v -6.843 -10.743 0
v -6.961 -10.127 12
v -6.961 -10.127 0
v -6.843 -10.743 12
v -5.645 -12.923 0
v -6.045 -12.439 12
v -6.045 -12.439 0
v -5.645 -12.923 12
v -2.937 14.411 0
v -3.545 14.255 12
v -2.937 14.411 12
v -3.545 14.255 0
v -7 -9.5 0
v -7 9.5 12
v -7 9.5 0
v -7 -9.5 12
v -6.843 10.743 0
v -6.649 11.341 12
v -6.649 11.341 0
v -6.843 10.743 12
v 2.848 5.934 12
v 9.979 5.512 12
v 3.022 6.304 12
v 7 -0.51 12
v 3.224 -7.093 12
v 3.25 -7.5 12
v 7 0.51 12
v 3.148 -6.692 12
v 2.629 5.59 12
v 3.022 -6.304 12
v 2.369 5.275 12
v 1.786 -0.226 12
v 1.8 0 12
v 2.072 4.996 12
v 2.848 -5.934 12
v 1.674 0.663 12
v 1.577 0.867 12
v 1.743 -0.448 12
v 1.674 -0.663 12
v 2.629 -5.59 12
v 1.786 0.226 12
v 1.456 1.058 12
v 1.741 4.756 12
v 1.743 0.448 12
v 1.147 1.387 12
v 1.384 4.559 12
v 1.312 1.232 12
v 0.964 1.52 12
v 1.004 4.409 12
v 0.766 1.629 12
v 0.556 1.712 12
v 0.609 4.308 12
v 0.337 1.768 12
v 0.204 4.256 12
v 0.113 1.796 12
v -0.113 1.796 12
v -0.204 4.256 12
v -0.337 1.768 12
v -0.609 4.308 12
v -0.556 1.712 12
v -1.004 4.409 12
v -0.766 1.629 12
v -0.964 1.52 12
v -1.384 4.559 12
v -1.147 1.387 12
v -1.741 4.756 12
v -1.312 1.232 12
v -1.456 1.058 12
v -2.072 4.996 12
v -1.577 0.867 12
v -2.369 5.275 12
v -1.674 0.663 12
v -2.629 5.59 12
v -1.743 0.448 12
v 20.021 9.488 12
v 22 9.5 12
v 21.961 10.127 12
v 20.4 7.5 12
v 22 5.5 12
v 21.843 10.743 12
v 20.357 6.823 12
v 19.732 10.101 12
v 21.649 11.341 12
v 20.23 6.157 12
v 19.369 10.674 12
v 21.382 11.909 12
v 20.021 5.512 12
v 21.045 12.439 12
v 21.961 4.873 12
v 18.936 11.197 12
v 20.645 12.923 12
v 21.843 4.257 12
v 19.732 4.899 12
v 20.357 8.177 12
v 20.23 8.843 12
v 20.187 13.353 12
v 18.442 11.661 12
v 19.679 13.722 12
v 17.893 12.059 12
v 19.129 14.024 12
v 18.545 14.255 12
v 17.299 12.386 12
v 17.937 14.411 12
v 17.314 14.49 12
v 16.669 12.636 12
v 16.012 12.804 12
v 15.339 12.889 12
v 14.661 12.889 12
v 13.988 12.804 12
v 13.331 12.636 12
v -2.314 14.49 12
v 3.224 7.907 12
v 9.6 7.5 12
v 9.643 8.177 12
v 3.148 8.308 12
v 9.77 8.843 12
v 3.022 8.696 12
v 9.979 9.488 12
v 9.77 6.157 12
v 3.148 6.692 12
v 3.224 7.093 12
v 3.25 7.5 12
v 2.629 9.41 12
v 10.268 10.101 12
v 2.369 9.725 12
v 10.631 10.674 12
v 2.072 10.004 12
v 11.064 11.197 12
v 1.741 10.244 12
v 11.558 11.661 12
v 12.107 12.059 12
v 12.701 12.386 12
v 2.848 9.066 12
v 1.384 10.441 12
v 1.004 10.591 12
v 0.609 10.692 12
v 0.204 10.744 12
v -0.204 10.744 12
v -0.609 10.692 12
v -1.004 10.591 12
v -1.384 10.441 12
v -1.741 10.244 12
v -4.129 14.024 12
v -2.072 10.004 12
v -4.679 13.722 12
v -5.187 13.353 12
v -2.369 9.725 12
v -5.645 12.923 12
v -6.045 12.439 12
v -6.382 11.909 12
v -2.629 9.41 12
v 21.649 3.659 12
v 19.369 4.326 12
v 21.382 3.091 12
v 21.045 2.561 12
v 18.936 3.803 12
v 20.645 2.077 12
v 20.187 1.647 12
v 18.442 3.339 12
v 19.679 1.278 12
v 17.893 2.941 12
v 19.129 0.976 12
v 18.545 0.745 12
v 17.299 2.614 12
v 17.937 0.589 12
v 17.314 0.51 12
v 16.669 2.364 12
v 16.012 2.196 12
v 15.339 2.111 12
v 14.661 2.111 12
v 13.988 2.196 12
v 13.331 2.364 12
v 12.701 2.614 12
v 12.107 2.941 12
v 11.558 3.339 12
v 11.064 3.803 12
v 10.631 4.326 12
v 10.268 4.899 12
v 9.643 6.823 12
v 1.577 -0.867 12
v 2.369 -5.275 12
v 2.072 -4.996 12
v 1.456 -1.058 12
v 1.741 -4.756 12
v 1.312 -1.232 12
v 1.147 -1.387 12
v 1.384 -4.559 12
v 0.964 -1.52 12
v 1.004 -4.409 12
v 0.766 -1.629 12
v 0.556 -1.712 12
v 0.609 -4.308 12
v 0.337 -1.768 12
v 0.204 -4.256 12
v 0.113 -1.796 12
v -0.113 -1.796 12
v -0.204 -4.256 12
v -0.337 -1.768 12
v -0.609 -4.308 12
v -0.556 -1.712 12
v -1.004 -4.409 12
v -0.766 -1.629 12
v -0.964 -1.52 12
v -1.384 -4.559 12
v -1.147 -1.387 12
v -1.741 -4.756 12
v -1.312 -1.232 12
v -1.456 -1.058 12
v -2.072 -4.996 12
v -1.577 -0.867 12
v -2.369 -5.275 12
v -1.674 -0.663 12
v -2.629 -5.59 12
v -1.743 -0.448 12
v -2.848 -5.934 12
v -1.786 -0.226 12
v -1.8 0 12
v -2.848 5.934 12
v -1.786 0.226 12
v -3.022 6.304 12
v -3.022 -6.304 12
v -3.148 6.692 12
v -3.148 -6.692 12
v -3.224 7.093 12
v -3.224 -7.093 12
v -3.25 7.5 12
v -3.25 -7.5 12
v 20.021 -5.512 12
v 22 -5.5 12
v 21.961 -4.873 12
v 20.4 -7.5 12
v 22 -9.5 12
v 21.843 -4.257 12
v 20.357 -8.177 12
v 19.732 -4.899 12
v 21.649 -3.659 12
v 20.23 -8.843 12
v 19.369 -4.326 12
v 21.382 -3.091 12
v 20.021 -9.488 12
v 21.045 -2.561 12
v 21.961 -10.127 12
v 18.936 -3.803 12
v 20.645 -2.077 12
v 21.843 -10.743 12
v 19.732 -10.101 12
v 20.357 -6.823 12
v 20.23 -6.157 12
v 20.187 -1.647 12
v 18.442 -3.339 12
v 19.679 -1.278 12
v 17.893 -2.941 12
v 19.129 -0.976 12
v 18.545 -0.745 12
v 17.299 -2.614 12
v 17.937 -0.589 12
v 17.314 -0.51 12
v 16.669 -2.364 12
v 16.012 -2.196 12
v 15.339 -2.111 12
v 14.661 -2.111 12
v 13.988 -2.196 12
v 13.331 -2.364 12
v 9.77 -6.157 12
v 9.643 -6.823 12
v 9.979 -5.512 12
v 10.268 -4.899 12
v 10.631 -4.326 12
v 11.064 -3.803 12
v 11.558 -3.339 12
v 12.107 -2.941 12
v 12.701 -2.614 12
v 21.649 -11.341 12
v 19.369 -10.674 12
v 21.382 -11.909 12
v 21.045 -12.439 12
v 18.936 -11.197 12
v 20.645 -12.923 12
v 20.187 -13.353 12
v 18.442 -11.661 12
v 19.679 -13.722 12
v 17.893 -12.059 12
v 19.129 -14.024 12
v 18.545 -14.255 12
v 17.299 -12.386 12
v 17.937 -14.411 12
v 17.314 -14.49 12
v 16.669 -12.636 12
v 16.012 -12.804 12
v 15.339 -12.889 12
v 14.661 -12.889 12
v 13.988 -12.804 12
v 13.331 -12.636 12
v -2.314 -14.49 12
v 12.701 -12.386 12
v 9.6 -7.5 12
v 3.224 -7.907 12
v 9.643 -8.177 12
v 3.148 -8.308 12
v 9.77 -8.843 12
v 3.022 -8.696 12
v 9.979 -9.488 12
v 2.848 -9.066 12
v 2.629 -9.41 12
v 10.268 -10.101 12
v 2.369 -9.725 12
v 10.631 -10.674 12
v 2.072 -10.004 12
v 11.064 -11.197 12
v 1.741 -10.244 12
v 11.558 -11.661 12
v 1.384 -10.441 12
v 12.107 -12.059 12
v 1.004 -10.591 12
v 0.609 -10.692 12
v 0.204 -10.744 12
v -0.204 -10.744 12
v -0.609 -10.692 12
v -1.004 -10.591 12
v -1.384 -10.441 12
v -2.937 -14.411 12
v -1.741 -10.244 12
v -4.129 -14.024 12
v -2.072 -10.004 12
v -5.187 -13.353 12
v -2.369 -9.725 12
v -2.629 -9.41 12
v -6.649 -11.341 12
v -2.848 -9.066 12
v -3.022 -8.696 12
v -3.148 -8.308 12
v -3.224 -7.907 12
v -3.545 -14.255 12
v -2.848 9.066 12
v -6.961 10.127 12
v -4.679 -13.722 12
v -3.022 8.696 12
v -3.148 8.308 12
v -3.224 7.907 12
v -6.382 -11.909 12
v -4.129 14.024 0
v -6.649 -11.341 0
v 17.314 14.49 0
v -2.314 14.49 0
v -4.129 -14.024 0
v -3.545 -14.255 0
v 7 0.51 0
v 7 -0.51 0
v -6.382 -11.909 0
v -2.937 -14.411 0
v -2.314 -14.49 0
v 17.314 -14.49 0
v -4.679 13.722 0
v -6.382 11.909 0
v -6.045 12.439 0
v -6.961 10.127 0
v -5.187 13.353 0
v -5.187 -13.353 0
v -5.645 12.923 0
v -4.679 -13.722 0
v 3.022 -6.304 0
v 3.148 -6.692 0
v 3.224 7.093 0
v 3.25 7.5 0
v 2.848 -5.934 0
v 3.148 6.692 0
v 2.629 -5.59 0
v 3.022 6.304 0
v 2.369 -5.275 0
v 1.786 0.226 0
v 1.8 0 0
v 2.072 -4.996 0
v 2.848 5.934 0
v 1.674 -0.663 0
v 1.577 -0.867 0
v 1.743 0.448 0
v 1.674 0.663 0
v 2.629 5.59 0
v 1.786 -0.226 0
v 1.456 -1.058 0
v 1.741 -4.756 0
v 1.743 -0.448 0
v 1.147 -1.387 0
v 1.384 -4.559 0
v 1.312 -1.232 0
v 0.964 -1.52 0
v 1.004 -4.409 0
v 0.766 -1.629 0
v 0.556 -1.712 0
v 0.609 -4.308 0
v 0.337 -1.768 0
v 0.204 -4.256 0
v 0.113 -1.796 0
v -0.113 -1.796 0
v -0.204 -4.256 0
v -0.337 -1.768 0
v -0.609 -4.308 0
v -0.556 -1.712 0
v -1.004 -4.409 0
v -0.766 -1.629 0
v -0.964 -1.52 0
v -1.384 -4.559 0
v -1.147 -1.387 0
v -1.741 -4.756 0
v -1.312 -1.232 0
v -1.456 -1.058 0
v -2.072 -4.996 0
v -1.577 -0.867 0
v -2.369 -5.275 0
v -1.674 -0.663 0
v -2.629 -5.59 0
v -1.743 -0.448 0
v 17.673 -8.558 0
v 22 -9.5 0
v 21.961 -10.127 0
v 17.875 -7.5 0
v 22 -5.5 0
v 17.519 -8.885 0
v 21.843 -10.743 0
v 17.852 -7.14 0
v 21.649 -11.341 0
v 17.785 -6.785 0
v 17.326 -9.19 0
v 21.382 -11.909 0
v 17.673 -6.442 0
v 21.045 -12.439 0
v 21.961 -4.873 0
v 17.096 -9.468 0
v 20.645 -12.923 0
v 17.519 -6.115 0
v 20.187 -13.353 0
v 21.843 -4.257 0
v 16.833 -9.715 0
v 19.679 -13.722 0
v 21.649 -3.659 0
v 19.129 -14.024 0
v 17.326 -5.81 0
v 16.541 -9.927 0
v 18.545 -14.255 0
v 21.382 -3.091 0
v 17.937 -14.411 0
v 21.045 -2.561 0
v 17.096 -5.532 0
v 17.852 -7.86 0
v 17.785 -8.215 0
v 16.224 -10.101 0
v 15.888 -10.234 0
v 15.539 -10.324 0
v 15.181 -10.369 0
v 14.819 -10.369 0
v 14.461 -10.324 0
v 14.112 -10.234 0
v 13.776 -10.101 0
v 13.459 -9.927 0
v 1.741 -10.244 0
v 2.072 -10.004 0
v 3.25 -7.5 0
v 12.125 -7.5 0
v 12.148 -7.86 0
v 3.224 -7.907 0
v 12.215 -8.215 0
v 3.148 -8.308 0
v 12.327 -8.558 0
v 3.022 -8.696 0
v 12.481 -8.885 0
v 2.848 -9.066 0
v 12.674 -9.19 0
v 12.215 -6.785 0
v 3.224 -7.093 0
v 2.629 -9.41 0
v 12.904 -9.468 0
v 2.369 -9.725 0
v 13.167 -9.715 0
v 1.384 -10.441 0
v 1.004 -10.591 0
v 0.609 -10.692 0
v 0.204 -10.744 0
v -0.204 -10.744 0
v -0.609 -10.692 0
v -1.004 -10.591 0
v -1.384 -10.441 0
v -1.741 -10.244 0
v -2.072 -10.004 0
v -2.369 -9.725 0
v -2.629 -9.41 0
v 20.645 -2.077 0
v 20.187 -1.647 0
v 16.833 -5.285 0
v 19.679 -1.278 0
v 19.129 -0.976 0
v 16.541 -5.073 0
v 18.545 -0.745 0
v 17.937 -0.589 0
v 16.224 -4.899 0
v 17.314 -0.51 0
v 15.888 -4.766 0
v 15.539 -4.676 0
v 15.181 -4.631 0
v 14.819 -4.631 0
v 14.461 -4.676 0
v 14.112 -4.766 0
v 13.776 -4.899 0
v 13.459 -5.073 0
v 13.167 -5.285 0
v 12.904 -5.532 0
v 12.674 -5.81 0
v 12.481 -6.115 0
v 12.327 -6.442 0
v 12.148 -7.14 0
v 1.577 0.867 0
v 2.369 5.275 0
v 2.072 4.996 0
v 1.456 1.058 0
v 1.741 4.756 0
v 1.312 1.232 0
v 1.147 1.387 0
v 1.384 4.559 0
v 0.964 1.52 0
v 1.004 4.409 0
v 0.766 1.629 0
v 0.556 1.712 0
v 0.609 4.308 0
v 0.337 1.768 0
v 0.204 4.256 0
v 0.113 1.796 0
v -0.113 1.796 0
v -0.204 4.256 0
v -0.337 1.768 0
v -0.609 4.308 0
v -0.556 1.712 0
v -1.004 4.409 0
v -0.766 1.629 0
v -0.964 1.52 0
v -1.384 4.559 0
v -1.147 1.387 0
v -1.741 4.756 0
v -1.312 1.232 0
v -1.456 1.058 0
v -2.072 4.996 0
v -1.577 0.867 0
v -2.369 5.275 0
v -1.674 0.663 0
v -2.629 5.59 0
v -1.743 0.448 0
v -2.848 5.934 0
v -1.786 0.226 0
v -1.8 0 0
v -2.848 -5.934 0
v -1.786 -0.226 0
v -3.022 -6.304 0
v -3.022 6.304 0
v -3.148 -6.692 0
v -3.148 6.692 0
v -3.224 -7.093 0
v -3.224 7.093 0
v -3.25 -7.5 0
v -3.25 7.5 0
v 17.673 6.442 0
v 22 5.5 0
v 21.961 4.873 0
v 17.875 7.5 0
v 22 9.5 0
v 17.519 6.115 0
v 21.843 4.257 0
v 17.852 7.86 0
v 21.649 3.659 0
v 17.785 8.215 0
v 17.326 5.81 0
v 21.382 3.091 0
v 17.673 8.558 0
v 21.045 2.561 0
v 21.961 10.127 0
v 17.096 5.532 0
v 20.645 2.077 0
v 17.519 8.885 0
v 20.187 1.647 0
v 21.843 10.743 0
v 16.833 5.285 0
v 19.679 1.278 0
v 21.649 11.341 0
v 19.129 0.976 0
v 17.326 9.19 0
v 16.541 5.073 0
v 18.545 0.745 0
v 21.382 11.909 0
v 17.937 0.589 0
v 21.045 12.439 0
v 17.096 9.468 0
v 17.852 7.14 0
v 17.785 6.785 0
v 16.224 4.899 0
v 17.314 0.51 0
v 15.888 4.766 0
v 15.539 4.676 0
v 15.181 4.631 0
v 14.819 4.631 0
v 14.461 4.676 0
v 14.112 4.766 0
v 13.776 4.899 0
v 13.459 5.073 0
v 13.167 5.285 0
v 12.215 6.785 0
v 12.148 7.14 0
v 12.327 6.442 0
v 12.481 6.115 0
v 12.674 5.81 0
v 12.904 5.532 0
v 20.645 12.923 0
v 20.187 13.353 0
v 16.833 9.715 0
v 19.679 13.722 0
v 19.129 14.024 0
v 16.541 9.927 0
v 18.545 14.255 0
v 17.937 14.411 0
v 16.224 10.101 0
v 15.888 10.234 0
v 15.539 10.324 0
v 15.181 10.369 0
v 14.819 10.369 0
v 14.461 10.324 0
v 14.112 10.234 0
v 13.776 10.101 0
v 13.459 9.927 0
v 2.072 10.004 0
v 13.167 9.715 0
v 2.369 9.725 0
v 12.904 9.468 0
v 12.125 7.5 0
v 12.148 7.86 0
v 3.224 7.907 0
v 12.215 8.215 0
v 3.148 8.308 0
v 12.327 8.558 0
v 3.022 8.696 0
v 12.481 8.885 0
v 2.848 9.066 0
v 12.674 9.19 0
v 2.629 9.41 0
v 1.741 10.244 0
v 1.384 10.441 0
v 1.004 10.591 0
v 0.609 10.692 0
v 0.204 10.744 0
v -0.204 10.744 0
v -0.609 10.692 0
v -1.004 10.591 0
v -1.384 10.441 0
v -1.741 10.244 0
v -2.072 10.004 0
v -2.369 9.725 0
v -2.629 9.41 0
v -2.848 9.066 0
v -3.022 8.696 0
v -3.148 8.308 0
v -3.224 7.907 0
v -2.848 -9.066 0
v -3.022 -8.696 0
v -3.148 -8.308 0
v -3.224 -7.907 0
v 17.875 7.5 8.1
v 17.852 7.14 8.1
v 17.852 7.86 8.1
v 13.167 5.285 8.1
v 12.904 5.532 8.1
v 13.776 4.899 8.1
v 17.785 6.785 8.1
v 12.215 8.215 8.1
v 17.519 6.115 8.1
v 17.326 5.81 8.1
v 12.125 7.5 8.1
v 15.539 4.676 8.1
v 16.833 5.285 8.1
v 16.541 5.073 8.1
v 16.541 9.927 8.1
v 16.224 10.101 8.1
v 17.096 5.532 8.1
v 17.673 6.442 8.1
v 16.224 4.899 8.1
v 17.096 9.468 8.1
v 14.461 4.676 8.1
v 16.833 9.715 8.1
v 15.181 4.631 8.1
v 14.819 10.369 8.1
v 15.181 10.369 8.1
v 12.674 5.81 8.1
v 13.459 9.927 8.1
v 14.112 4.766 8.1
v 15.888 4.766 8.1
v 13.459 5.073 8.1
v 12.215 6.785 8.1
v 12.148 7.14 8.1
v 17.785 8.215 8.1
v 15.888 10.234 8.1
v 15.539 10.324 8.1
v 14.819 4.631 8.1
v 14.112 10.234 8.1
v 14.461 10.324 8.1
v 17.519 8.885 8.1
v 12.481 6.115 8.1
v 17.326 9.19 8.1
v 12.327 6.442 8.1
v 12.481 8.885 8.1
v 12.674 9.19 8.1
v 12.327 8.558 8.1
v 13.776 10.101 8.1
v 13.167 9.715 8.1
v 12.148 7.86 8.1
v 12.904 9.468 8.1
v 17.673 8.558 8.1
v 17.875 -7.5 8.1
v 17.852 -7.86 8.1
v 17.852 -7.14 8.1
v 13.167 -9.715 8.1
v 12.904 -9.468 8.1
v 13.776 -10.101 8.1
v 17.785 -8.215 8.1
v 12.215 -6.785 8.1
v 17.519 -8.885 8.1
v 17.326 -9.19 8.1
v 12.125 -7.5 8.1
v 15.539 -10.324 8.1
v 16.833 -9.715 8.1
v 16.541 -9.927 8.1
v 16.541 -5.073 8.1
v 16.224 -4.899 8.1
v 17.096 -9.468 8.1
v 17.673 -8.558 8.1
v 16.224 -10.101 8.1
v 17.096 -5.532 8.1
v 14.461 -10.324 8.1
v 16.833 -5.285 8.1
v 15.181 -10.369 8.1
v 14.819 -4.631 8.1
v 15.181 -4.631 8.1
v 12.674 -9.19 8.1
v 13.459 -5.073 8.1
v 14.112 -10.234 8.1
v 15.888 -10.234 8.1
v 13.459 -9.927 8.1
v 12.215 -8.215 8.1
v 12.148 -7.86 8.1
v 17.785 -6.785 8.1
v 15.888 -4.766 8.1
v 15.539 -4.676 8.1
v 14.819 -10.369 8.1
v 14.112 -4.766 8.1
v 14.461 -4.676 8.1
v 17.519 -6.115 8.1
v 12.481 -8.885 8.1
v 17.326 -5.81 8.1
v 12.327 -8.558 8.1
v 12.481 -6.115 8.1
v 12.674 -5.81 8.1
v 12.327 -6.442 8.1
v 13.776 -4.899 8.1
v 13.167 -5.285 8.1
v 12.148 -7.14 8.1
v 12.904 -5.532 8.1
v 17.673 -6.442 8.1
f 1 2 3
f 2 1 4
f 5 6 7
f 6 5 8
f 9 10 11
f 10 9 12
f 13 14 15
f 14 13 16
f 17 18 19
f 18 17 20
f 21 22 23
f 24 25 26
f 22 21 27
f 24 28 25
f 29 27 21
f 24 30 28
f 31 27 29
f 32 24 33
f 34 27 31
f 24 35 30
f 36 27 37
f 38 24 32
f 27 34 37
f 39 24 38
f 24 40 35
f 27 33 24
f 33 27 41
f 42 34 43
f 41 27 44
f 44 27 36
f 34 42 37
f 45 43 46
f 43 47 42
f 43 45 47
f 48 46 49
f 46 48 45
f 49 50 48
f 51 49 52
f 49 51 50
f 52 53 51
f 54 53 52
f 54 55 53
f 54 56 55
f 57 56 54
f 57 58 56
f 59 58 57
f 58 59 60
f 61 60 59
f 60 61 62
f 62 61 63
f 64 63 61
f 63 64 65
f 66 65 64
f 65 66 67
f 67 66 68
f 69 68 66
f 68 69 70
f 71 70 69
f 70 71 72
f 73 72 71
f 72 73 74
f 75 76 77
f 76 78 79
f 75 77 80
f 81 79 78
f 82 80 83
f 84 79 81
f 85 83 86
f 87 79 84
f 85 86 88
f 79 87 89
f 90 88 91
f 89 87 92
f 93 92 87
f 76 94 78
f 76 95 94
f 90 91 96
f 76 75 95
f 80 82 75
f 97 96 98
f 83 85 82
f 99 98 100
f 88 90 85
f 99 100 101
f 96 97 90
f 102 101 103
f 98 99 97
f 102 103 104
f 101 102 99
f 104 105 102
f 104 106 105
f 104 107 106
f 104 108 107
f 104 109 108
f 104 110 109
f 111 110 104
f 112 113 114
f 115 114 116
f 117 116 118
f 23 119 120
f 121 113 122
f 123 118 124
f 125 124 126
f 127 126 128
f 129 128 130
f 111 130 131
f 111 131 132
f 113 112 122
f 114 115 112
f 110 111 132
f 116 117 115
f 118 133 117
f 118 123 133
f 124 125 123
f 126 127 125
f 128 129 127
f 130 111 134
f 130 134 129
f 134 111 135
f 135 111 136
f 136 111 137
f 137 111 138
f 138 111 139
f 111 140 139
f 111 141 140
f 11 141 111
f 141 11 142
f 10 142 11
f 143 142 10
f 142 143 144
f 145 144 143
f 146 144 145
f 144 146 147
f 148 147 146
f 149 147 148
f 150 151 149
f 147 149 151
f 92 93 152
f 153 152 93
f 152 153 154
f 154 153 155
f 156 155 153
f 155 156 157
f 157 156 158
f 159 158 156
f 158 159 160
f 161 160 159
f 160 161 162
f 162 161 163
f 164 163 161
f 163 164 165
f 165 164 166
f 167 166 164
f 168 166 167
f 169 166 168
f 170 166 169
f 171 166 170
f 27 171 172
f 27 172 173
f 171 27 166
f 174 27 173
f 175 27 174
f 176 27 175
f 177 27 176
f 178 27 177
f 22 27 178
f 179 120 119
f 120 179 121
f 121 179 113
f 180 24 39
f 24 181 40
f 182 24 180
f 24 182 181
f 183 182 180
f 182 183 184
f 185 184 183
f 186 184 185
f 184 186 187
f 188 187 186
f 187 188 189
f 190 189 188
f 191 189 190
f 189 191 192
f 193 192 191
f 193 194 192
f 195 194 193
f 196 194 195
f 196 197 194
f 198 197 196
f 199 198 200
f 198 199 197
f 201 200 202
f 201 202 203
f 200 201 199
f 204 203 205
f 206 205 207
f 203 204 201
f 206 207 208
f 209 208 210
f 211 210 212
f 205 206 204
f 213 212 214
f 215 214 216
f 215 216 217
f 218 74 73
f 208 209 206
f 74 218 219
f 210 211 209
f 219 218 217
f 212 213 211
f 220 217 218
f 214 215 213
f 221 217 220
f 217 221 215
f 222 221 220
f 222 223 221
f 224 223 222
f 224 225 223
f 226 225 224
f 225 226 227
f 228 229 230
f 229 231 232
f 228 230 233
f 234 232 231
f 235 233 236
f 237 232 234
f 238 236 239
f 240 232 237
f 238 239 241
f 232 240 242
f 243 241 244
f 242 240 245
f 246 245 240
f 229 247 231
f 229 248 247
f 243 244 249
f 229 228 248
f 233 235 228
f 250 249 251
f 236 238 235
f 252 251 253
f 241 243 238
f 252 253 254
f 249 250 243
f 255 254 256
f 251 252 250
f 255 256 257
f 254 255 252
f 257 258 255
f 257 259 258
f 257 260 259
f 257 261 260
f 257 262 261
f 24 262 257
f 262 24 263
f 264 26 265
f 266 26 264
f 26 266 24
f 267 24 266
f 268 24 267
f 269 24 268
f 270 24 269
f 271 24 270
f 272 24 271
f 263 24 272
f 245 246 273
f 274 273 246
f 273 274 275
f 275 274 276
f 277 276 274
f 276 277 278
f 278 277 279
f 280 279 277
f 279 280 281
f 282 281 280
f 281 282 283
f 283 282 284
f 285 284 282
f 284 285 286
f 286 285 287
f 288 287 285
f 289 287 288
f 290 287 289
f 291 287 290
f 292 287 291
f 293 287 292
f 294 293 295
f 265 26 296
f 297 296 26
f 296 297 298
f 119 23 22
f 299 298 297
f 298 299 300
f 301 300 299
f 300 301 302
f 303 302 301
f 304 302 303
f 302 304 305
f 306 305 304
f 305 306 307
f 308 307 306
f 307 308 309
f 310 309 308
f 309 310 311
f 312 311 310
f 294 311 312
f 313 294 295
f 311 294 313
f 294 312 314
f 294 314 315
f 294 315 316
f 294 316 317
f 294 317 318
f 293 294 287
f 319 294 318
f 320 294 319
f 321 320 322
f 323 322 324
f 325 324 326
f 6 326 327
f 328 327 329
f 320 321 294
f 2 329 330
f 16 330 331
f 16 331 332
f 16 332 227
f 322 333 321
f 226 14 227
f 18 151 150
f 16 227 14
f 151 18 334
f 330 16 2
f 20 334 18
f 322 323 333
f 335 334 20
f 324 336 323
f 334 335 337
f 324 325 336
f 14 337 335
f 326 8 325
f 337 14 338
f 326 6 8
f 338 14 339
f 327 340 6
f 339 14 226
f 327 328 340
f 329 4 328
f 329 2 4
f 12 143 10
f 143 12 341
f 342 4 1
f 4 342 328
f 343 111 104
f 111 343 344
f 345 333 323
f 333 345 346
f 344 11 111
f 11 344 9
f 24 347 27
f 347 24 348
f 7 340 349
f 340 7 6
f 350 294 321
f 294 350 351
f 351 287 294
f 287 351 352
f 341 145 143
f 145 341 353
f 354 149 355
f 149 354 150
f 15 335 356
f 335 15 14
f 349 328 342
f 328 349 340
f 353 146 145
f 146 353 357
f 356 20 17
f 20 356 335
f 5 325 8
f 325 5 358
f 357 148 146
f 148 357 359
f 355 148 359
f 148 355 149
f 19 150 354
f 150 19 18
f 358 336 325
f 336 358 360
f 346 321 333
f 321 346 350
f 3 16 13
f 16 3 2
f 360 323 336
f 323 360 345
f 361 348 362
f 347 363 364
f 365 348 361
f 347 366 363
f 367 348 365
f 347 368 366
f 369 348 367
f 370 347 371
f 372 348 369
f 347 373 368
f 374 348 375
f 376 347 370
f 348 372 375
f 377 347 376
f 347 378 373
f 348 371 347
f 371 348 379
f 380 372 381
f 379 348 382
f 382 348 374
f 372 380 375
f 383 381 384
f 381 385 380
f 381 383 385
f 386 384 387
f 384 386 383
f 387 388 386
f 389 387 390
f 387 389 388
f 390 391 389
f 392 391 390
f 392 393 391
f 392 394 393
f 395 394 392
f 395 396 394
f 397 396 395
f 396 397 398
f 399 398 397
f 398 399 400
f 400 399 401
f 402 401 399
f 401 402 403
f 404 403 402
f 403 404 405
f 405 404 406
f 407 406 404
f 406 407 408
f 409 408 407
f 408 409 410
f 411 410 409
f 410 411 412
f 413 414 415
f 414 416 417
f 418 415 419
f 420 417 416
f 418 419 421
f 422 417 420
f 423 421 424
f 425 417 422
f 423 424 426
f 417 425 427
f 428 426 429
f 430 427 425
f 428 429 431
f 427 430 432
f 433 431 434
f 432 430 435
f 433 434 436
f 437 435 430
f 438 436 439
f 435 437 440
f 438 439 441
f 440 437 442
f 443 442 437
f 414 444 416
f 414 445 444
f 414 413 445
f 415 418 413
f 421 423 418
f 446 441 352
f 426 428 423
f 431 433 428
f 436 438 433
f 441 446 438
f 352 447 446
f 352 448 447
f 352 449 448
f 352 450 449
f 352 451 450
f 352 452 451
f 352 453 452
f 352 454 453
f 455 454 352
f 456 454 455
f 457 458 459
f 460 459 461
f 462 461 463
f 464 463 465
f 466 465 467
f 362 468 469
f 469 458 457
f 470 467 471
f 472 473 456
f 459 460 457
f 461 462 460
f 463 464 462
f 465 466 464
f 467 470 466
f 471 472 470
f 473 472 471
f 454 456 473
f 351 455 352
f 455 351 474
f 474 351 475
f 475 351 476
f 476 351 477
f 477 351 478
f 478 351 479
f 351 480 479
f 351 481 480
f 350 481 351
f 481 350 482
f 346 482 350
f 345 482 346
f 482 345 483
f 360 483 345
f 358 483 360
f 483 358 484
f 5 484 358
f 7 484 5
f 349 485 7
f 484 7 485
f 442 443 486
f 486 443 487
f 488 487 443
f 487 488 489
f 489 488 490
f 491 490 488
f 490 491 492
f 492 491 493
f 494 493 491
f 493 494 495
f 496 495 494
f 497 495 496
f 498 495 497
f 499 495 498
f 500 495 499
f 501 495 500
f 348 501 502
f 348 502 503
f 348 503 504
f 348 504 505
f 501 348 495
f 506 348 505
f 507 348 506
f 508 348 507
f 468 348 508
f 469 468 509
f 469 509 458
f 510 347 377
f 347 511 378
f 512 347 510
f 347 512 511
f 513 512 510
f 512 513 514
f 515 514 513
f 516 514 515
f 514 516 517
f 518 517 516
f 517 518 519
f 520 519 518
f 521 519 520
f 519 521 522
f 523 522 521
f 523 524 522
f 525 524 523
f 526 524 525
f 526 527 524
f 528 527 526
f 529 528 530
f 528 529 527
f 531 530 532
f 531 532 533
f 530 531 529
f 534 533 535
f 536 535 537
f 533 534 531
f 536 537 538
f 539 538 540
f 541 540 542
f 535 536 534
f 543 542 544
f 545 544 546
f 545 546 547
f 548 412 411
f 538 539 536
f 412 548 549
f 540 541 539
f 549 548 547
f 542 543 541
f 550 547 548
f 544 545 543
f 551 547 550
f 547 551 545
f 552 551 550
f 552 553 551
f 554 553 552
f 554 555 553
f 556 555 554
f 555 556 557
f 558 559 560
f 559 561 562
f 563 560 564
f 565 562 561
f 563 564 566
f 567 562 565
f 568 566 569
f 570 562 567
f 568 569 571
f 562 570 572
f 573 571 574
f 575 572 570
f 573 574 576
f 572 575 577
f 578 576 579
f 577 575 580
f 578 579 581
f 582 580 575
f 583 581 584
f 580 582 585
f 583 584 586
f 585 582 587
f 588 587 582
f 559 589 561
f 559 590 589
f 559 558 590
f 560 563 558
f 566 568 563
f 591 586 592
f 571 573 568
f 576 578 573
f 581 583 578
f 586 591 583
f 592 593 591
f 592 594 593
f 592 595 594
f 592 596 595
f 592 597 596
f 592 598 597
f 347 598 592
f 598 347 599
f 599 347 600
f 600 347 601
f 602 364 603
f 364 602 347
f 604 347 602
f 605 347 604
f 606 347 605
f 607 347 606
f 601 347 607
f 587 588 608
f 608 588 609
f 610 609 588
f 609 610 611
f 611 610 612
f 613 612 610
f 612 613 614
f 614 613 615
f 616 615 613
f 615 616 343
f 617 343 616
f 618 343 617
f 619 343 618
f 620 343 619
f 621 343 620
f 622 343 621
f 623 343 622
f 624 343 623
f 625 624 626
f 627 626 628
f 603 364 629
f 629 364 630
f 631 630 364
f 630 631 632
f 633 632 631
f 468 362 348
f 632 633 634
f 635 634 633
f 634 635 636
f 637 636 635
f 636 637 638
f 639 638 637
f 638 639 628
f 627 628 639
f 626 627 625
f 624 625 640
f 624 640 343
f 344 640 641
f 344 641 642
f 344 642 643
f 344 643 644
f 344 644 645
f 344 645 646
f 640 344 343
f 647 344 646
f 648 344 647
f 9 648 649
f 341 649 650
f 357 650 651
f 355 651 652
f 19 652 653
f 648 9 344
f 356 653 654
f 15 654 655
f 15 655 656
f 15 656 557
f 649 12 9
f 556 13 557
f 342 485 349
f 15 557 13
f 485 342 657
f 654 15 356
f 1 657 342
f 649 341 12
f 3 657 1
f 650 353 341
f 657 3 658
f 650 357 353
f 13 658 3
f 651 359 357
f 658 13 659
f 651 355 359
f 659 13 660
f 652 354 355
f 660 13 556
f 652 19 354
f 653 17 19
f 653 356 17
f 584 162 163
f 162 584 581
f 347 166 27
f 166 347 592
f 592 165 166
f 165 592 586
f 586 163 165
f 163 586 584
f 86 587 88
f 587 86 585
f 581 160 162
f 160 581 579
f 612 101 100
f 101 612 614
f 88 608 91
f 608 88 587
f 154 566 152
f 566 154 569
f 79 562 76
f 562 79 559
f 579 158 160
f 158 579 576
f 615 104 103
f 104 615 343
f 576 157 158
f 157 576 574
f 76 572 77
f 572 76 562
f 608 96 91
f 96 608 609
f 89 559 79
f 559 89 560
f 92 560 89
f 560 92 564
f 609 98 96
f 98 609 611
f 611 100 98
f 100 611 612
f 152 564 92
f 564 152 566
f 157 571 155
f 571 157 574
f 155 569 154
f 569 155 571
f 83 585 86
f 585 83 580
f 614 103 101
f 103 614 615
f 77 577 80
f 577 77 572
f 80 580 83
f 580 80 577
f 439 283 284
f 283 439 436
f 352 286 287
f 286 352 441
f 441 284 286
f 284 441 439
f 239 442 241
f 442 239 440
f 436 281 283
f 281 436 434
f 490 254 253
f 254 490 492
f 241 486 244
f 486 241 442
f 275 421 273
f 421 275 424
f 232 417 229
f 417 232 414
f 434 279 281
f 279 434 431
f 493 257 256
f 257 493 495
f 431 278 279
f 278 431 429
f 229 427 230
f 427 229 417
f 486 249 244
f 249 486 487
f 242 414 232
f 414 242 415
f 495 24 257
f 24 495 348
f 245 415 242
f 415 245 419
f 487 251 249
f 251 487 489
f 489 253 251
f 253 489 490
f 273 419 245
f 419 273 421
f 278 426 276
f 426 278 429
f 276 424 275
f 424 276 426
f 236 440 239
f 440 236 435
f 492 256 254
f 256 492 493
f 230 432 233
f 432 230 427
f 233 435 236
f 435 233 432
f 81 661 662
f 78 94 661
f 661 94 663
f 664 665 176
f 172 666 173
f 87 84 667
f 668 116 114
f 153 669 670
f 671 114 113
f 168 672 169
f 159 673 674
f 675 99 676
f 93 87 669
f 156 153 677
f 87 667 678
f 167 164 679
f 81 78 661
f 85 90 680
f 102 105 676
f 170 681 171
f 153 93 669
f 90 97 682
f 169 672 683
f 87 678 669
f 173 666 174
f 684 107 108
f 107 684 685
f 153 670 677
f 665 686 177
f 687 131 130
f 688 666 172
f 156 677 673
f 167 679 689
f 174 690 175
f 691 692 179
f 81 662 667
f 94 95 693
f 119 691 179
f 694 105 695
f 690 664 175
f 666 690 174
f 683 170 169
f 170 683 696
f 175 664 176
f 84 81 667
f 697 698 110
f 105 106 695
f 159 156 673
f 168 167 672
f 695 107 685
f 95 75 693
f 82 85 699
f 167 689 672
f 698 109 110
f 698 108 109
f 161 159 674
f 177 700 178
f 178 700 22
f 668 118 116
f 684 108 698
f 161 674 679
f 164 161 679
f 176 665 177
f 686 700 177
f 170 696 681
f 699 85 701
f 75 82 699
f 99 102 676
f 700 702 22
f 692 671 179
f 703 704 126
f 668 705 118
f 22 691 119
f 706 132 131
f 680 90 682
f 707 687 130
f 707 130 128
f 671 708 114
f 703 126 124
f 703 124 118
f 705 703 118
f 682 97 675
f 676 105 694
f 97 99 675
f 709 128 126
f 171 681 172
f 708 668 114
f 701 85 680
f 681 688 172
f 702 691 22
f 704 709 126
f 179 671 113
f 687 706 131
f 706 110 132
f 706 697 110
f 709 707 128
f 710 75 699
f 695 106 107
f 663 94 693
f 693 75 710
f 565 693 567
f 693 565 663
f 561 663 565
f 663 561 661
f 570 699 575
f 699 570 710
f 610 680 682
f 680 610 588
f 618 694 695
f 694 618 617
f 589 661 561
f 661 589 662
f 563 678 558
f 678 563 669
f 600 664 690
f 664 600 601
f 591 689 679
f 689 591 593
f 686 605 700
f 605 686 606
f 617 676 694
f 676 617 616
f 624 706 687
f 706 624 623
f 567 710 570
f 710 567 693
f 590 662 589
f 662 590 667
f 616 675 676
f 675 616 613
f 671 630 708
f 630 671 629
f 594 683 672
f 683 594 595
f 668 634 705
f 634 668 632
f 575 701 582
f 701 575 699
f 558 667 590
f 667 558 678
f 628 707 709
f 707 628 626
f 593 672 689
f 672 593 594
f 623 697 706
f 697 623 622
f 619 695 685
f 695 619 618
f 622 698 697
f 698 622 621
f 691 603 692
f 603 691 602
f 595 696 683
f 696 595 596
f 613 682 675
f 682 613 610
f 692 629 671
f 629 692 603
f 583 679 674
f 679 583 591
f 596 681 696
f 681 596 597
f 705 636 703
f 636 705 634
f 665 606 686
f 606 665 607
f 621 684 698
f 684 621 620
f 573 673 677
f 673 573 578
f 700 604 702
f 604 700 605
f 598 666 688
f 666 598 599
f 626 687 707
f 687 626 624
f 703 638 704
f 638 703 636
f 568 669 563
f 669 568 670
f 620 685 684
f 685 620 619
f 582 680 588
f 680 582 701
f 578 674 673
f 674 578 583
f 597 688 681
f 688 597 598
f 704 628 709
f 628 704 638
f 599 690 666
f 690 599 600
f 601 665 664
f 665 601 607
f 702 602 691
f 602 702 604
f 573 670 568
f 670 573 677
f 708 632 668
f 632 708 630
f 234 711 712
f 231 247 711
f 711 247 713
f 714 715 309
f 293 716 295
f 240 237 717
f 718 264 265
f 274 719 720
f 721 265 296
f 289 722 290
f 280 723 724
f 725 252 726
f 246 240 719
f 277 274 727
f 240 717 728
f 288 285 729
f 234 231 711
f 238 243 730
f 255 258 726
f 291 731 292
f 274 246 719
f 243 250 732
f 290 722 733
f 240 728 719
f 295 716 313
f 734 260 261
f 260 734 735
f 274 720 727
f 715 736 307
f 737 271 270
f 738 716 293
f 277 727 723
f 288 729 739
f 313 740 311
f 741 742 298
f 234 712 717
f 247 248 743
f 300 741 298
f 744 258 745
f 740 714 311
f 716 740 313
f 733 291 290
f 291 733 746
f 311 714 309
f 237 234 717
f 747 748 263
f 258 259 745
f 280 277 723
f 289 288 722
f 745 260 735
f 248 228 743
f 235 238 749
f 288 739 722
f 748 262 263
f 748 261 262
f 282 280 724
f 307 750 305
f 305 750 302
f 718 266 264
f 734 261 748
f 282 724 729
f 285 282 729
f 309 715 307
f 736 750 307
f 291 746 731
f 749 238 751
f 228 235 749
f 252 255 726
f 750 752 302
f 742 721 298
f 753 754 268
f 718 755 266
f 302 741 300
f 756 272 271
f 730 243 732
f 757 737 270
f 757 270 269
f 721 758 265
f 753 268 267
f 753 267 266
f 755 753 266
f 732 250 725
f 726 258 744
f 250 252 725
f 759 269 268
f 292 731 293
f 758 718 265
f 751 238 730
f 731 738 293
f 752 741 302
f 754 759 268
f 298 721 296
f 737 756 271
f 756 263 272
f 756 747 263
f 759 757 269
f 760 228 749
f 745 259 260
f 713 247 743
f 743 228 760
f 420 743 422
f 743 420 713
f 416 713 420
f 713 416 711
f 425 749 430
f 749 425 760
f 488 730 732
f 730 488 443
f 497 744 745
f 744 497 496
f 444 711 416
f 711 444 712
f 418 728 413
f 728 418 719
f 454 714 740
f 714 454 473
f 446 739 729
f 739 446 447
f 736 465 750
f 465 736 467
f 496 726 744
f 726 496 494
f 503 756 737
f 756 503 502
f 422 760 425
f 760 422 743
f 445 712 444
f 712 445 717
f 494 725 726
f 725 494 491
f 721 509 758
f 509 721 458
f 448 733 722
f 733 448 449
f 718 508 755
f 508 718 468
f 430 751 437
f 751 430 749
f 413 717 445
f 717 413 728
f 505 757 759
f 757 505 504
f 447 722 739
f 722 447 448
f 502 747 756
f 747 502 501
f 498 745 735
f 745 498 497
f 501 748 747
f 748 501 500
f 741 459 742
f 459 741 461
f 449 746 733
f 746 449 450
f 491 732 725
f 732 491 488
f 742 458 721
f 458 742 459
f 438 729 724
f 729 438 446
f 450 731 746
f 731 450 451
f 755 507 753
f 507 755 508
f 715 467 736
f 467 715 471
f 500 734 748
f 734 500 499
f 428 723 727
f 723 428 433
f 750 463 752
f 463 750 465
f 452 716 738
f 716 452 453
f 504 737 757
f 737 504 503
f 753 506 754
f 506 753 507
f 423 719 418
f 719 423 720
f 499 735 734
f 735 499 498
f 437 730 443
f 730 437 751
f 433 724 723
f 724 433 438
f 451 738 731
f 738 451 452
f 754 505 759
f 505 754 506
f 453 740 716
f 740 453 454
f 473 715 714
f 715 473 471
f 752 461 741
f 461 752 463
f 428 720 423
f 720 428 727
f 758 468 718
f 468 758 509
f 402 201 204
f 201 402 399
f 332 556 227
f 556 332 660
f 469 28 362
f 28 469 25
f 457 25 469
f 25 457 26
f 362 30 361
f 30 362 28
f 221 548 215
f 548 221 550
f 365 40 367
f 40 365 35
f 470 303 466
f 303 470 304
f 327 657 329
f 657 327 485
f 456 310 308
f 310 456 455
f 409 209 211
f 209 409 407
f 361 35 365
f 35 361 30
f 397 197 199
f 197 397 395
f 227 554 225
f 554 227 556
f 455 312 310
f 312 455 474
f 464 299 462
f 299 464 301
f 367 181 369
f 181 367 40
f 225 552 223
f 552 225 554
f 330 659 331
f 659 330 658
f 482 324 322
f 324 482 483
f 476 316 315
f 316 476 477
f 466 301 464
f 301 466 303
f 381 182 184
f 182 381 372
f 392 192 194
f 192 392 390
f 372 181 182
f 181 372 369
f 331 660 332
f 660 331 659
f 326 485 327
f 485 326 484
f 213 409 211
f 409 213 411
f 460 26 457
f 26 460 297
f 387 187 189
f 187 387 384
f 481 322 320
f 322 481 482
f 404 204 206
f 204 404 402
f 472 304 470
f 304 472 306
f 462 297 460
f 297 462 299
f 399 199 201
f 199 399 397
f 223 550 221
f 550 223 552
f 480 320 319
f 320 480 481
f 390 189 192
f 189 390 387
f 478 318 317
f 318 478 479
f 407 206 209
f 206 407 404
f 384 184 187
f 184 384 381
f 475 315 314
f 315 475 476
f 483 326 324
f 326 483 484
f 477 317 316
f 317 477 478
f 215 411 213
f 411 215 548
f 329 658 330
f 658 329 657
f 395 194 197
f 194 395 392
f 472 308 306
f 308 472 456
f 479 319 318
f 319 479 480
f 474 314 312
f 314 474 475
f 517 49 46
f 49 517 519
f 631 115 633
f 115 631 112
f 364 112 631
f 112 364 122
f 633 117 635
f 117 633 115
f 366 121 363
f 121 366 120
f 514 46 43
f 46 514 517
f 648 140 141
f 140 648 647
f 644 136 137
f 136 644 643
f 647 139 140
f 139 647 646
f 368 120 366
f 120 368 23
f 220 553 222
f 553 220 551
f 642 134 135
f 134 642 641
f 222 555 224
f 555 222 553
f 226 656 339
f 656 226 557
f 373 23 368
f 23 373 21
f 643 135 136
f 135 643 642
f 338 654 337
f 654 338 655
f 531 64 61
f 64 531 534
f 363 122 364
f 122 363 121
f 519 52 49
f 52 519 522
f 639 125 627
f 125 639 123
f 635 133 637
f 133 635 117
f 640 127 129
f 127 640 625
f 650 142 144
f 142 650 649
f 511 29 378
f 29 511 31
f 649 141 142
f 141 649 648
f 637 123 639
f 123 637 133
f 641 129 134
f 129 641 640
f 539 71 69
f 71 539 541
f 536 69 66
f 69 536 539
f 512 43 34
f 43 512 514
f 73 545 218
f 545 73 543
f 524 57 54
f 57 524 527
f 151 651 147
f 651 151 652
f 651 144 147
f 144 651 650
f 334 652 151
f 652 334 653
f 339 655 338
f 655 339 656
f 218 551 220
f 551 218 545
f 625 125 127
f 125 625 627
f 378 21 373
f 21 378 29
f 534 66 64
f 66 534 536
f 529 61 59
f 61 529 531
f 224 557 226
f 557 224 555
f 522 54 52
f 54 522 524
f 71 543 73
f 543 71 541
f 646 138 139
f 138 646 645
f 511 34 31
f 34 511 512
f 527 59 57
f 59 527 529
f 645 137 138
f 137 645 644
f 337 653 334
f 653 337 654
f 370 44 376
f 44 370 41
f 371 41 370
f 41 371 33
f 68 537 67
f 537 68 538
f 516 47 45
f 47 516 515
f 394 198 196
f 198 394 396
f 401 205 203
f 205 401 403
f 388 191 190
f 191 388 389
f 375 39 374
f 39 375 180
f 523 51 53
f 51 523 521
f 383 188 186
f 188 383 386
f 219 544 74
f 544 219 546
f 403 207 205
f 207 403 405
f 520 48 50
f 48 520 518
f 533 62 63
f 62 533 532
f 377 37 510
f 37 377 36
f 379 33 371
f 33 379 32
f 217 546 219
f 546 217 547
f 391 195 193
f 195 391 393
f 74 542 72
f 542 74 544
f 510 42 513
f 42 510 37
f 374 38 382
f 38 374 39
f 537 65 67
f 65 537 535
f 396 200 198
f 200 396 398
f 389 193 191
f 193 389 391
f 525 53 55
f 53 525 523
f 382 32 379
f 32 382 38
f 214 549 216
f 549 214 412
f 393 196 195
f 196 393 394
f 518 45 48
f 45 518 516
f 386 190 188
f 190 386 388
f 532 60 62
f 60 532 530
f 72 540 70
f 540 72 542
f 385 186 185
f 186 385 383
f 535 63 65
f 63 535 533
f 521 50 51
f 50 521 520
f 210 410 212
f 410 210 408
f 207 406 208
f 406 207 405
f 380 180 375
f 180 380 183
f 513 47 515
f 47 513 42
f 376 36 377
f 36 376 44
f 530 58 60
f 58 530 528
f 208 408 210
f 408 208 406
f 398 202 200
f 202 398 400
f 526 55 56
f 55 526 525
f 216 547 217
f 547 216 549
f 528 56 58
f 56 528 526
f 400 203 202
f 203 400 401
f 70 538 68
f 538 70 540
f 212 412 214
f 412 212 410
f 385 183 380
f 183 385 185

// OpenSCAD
$fn = 50;


difference() {
	union() {
		hull() {
			translate(v = [-2.0000000000, 9.5000000000, 0]) {
				cylinder(h = 12, r = 5);
			}
			translate(v = [2.0000000000, 9.5000000000, 0]) {
				cylinder(h = 12, r = 5);
			}
			translate(v = [-2.0000000000, -9.5000000000, 0]) {
				cylinder(h = 12, r = 5);
			}
			translate(v = [2.0000000000, -9.5000000000, 0]) {
				cylinder(h = 12, r = 5);
			}
		}
		translate(v = [7.5000000000, 7.5000000000, 0]) {
			hull() {
				translate(v = [-9.5000000000, 2.0000000000, 0]) {
					cylinder(h = 12, r = 5);
				}
				translate(v = [9.5000000000, 2.0000000000, 0]) {
					cylinder(h = 12, r = 5);
				}
				translate(v = [-9.5000000000, -2.0000000000, 0]) {
					cylinder(h = 12, r = 5);
				}
				translate(v = [9.5000000000, -2.0000000000, 0]) {
					cylinder(h = 12, r = 5);
				}
			}
		}
		translate(v = [7.5000000000, -7.5000000000, 0]) {
			hull() {
				translate(v = [-9.5000000000, 2.0000000000, 0]) {
					cylinder(h = 12, r = 5);
				}
				translate(v = [9.5000000000, 2.0000000000, 0]) {
					cylinder(h = 12, r = 5);
				}
				translate(v = [-9.5000000000, -2.0000000000, 0]) {
					cylinder(h = 12, r = 5);
				}
				translate(v = [9.5000000000, -2.0000000000, 0]) {
					cylinder(h = 12, r = 5);
				}
			}
		}
	}
	union() {
		translate(v = [15.0000000000, 7.5000000000, 12]) {
			rotate(a = [0, 0, 0]) {
				difference() {
					union() {
						#translate(v = [0, 0, -12.0000000000]) {
							cylinder(h = 12, r = 2.6000000000);
						}
						#translate(v = [0, 0, -3.9000000000]) {
							cylinder(h = 3.9000000000, r1 = 2.8750000000, r2 = 5.4000000000);
						}
						#translate(v = [0, 0, -12.0000000000]) {
							cylinder(h = 12, r = 2.8750000000);
						}
						#translate(v = [0, 0, -12.0000000000]) {
							cylinder(h = 12, r = 2.6000000000);
						}
					}
					union();
				}
			}
		}
		translate(v = [15.0000000000, -7.5000000000, 12]) {
			rotate(a = [0, 0, 0]) {
				difference() {
					union() {
						#translate(v = [0, 0, -12.0000000000]) {
							cylinder(h = 12, r = 2.6000000000);
						}
						#translate(v = [0, 0, -3.9000000000]) {
							cylinder(h = 3.9000000000, r1 = 2.8750000000, r2 = 5.4000000000);
						}
						#translate(v = [0, 0, -12.0000000000]) {
							cylinder(h = 12, r = 2.8750000000);
						}
						#translate(v = [0, 0, -12.0000000000]) {
							cylinder(h = 12, r = 2.6000000000);
						}
					}
					union();
				}
			}
		}
		translate(v = [0.0000000000, -7.5000000000, 0]) {
			translate(v = [0, 0, -100]) {
				cylinder(h = 200, r = 3.2500000000);
			}
		}
		translate(v = [0.0000000000, 7.5000000000, 0]) {
			translate(v = [0, 0, -100]) {
				cylinder(h = 200, r = 3.2500000000);
			}
		}
		translate(v = [0.0000000000, -7.5000000000, 0]) {
			translate(v = [0, 0, -100]) {
				cylinder(h = 200, r = 1.8000000000);
			}
		}
		translate(v = [0, 0, -100]) {
			cylinder(h = 200, r = 1.8000000000);
		}
		translate(v = [0.0000000000, 7.5000000000, 0]) {
			translate(v = [0, 0, -100]) {
				cylinder(h = 200, r = 1.8000000000);
			}
		}
	}
}
